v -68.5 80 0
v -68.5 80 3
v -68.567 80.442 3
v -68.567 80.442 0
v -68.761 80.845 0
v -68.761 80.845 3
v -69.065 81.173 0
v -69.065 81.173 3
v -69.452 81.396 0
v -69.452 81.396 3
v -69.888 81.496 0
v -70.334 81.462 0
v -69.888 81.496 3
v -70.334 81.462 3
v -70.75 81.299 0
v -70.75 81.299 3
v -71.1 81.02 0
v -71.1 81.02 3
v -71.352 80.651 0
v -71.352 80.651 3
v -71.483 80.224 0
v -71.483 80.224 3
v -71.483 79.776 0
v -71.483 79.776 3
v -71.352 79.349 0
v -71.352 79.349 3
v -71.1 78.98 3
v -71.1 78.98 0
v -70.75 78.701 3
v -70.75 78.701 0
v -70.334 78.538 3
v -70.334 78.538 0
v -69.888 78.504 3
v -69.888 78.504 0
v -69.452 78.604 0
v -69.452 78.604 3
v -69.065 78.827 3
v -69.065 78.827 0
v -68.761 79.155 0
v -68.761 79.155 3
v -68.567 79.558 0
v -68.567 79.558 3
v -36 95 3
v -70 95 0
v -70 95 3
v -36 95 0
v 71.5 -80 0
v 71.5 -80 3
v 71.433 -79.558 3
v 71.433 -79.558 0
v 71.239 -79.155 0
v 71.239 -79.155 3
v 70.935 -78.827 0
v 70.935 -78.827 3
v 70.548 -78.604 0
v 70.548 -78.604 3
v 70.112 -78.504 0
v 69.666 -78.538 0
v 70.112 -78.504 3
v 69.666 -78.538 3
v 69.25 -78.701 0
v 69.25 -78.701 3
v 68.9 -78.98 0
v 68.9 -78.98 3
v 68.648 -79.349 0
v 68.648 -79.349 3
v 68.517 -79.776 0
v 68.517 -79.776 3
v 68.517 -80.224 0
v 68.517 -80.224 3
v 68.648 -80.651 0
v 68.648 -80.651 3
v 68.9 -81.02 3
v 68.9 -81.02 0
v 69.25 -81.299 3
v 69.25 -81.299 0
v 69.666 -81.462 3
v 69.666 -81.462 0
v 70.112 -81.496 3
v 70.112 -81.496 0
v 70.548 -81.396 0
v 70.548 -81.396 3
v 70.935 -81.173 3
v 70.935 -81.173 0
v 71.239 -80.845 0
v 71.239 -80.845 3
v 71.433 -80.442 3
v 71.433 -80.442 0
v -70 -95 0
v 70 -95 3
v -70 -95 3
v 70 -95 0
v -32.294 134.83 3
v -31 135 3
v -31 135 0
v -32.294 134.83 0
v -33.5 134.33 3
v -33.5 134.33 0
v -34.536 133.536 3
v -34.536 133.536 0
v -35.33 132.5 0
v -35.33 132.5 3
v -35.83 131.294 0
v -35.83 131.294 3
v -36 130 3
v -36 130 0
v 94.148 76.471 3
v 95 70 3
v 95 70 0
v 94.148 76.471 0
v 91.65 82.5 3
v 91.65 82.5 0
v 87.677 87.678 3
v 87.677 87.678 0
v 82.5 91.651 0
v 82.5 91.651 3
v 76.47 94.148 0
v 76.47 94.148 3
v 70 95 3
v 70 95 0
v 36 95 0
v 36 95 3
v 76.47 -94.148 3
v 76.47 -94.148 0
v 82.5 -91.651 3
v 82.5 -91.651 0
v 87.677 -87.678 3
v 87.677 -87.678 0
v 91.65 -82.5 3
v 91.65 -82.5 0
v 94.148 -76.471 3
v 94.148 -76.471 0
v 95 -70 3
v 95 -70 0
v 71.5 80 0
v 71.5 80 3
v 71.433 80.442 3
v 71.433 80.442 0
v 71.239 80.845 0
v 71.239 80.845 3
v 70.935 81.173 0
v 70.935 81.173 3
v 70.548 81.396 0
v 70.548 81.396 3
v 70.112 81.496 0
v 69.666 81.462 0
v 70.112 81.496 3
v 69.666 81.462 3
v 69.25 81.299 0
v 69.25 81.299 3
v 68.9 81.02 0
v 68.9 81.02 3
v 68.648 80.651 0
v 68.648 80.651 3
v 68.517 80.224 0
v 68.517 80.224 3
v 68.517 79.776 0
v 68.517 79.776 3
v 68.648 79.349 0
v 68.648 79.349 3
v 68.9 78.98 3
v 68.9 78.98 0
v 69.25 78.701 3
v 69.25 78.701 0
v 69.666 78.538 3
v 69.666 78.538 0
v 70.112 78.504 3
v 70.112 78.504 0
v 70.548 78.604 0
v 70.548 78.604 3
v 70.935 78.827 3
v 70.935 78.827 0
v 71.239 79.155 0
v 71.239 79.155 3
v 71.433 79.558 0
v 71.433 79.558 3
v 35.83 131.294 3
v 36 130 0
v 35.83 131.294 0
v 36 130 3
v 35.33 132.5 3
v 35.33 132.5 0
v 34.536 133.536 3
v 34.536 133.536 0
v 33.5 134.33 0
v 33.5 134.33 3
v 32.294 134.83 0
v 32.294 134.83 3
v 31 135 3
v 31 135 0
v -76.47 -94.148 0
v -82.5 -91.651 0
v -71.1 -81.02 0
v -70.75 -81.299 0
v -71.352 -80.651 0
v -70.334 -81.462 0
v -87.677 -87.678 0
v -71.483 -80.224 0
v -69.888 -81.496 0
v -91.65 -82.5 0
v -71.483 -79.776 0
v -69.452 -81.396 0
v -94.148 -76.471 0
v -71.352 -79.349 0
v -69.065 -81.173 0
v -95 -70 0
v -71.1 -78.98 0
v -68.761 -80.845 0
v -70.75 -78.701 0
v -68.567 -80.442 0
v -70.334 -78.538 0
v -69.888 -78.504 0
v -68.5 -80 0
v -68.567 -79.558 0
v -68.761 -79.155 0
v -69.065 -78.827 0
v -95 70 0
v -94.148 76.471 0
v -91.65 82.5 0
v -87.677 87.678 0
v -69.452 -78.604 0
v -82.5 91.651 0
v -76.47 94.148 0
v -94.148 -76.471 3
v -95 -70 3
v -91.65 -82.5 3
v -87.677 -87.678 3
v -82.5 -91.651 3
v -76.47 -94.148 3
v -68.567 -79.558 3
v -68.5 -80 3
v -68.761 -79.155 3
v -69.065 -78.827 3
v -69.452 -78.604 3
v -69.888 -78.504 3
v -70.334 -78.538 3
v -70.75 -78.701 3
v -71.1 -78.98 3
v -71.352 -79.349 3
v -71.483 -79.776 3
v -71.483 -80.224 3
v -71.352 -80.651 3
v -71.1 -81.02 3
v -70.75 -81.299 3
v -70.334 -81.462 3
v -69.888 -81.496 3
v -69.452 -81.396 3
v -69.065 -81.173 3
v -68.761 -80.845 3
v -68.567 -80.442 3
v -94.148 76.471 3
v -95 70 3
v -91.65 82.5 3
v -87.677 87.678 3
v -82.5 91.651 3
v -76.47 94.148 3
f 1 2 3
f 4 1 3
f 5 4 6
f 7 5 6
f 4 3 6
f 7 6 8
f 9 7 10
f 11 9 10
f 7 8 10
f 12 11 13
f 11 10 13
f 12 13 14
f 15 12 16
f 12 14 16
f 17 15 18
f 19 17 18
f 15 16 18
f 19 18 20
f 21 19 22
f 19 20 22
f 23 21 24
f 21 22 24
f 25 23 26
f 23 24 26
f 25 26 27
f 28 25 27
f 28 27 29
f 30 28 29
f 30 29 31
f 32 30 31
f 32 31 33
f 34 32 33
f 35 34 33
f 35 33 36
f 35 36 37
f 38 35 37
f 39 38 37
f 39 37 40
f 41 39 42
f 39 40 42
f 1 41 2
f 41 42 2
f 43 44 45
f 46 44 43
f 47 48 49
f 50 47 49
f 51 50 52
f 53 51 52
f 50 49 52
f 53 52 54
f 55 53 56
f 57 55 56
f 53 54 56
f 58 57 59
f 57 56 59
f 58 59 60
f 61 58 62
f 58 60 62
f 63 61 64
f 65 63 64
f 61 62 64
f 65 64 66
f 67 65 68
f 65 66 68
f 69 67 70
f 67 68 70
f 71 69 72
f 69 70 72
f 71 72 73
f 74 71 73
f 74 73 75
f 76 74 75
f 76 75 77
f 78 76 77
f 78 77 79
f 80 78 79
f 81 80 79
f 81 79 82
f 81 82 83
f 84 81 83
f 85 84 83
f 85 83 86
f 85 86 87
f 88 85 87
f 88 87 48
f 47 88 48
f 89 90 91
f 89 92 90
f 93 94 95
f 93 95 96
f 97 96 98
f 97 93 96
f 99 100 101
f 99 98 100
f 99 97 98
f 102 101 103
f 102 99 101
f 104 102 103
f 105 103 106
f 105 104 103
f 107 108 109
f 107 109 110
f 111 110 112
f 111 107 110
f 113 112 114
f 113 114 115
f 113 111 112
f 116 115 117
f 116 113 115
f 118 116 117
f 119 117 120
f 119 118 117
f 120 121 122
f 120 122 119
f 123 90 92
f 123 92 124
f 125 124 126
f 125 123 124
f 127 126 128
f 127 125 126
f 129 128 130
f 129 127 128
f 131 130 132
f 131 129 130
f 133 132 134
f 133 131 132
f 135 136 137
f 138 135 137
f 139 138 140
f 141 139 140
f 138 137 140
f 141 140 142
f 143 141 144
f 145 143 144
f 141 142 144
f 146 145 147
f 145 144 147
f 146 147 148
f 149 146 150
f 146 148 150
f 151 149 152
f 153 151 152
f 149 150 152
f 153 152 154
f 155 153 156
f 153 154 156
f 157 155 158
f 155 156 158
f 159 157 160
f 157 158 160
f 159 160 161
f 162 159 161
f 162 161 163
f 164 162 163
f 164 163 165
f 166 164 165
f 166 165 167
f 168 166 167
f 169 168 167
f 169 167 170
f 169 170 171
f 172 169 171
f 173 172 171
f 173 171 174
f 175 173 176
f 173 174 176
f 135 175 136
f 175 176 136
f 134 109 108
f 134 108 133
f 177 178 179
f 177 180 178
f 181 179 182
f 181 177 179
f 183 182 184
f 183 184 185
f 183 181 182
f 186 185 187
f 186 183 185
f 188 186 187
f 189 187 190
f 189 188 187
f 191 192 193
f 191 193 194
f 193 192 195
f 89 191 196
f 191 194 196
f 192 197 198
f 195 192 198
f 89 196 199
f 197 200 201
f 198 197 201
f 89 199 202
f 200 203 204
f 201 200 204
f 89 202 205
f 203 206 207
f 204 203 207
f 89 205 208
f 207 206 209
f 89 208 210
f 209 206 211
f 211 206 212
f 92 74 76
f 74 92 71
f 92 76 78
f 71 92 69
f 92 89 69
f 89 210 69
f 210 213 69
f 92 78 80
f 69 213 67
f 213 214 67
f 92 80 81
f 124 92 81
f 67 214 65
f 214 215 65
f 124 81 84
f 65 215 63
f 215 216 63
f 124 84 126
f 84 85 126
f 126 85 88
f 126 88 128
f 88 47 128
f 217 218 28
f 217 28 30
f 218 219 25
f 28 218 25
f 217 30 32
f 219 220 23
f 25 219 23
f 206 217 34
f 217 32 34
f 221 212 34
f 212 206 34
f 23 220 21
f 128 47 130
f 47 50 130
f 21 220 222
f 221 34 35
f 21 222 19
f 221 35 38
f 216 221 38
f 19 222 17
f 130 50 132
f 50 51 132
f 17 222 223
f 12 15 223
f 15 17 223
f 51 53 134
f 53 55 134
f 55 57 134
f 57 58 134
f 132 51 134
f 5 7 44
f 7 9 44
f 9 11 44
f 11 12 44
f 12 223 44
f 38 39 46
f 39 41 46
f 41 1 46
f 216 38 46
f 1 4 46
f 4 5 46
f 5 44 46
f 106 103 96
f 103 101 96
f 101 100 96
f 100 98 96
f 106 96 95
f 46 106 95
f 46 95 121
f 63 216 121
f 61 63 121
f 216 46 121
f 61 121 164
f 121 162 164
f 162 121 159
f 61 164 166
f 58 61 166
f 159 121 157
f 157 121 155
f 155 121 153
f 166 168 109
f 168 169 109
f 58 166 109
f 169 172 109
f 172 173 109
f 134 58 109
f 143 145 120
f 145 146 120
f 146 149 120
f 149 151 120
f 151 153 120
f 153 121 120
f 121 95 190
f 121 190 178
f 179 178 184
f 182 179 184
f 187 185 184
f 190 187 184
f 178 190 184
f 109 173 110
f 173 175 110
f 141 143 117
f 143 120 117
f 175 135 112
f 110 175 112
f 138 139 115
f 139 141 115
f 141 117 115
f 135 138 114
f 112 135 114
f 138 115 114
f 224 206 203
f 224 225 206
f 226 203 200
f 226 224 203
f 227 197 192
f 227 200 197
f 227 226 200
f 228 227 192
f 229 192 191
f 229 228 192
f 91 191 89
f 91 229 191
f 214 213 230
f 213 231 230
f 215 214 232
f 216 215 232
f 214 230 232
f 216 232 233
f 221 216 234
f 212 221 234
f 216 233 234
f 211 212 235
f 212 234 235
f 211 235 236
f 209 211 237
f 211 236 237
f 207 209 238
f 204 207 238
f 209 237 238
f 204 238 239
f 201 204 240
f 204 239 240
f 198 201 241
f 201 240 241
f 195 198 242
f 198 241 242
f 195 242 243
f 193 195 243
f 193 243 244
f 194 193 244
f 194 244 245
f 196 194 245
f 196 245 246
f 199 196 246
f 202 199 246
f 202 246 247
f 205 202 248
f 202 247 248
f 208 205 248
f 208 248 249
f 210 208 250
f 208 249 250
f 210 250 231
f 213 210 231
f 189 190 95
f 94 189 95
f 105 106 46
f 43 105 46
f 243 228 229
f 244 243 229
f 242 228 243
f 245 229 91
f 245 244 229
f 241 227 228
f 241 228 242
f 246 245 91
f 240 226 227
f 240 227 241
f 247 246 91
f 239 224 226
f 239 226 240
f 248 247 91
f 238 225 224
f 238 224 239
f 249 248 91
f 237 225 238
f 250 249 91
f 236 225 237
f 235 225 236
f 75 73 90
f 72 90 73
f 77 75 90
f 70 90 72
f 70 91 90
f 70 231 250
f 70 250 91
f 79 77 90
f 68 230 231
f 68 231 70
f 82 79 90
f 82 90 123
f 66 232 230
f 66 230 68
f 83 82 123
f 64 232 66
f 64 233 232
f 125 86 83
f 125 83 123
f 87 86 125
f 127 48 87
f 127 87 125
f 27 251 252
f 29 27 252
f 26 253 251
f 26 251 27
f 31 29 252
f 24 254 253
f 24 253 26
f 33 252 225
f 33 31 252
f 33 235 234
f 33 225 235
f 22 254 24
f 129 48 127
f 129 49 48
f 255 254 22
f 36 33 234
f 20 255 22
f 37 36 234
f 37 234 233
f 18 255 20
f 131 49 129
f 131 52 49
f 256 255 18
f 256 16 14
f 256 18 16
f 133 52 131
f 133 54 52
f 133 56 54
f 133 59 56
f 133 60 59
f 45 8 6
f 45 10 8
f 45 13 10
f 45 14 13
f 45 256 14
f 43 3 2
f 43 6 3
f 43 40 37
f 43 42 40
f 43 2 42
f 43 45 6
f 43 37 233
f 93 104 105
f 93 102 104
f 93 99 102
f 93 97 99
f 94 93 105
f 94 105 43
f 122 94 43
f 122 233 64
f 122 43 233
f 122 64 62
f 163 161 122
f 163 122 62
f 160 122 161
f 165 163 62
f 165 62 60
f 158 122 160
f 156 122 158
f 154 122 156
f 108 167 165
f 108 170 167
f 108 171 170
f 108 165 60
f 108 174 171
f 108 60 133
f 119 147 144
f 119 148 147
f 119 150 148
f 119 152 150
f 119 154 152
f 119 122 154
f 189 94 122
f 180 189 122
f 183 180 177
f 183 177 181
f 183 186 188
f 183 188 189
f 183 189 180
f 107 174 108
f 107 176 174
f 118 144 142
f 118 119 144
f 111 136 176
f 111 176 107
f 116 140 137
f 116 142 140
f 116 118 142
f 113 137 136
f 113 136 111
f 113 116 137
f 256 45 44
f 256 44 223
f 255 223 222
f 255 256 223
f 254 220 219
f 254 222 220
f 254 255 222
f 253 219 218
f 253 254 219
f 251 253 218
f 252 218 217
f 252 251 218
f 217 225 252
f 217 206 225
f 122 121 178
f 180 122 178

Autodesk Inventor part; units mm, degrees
ref_plane "YZ Plane" through (0, 0, 0) normal (1, 0, 0) x (0, 1, 0)
ref_plane "XZ Plane" through (0, 0, 0) normal (0, 1, 0) x (-1, 0, 0)
ref_plane "XY Plane" through (0, 0, 0) normal (0, 0, 1) x (1, 0, 0)
sketch "Sketch1" plane through (0, 0, 0) normal (0, 0, 1) x (1, 0, 0)
  point P0 (0, 0)
sketch "Sketch2" plane through (0, 0, 0) normal (0, 0, 1) x (1, 0, 0)
  line L0 (94.9998, -95.0001) -> (-94.9998, -95.0001)
  line L1 (-94.9998, -95.0001) -> (-94.9998, 95.0001)
  line L2 (-94.9998, 95.0001) -> (94.9998, 95.0001)
  line L3 (94.9998, 95.0001) -> (94.9998, -95.0001)
  line L4 (94.9998, -95.0001) -> (-94.9998, 95.0001) construction
  line L5 (-94.9998, -95.0001) -> (94.9998, 95.0001) construction
  line L6 (-36.0001, 94.9999) -> (36.0001, 94.9999)
  line L7 (36.0001, 94.9999) -> (36.0001, 135.0001)
  line L8 (36.0001, 135.0001) -> (-36.0001, 135.0001)
  line L9 (-36.0001, 135.0001) -> (-36.0001, 94.9999)
  line L10 (-36.0001, 94.9999) -> (36.0001, 135.0001) construction
  line L11 (36.0001, 94.9999) -> (-36.0001, 135.0001) construction
  point P0 (0, 115)
  point P1 (-36.0001, 95.0001)
  point P2 (36.0001, 95.0001)
extrude "Extrusion1" add sketch "Sketch2" along normal blind 3
sketch "Standoff holes" plane through (0, 0, 3) normal (0, 0, 1) x (1, 0, 0)
  circle A0 centre (70, 80) radius 1.5001
  circle A1 centre (70, -80) radius 1.5001
  circle A2 centre (-70, 80) radius 1.5001
  circle A3 centre (-70, -80) radius 1.5001
extrude "Extrusion2" cut sketch "Standoff holes" against normal blind 3
fillet "Fillet5" radius 25 4 edges at (-94.9998, 95.0001, 1.5) (94.9998, 95.0001, 1.5) (-94.9998, -95.0001, 1.5) (94.9998, -95.0001, 1.5)
fillet "Fillet6" radius 5 2 edges at (-36.0001, 135.0001, 1.5) (36.0001, 135.0001, 1.5)
sketch "Large Hammond mount holes" plane through (0, 0, 3) normal (0, 0, 1) x (1, 0, 0)
  circle A0 centre (17.6939, 39.717) radius 2.0002
  circle A1 centre (-18.3061, 125.717) radius 2.0002
sketch "BNC flange mount" plane through (0, 0, 3) normal (0, 0, 1) x (1, 0, 0)
  circle A0 centre (0, 0) radius 6.5
sketch "PX4FLOW mount holes" plane through (0, 0, 0) normal (0, 0, -1) x (-1, 0, 0)
  circle A0 centre (19.5263, 119.2212) radius 1.5872
  circle A1 centre (-4.2863, 119.2212) radius 1.5872
  circle A2 centre (-4.2863, 119.2212) radius 1.5872
  circle A3 centre (-4.2863, 89.0588) radius 1.5872
  circle A4 centre (19.5263, 89.0588) radius 1.5872
sketch "Guard rails mount holes" plane through (0, 0, 0) normal (0, 0, -1) x (-1, 0, 0)
  circle A0 centre (-32.3501, 38.3605) radius 1.2501
  circle A1 centre (-38.3605, 32.3501) radius 1.2501
  circle A2 centre (-60.6344, 66.6448) radius 1.2501
  circle A3 centre (-66.6448, 60.6344) radius 1.2501
  circle A4 centre (-38.3605, -32.3501) radius 1.2501
  circle A5 centre (-32.3501, -38.3605) radius 1.2501
  circle A6 centre (-66.6448, -60.6344) radius 1.2501
  circle A7 centre (-60.6344, -66.6448) radius 1.2501
  circle A8 centre (32.3501, -38.3605) radius 1.2501
  circle A9 centre (38.3605, -32.3501) radius 1.2501
  circle A10 centre (60.6344, -66.6448) radius 1.2501
  circle A11 centre (66.6448, -60.6344) radius 1.2501
  circle A12 centre (38.3605, 32.3501) radius 1.2501
  circle A13 centre (32.3501, 38.3605) radius 1.2501
  circle A14 centre (66.6448, 60.6344) radius 1.2501
  circle A15 centre (60.6344, 66.6448) radius 1.2501
properties part number "payload_bay_square_drill_holes" material "CFRP"
